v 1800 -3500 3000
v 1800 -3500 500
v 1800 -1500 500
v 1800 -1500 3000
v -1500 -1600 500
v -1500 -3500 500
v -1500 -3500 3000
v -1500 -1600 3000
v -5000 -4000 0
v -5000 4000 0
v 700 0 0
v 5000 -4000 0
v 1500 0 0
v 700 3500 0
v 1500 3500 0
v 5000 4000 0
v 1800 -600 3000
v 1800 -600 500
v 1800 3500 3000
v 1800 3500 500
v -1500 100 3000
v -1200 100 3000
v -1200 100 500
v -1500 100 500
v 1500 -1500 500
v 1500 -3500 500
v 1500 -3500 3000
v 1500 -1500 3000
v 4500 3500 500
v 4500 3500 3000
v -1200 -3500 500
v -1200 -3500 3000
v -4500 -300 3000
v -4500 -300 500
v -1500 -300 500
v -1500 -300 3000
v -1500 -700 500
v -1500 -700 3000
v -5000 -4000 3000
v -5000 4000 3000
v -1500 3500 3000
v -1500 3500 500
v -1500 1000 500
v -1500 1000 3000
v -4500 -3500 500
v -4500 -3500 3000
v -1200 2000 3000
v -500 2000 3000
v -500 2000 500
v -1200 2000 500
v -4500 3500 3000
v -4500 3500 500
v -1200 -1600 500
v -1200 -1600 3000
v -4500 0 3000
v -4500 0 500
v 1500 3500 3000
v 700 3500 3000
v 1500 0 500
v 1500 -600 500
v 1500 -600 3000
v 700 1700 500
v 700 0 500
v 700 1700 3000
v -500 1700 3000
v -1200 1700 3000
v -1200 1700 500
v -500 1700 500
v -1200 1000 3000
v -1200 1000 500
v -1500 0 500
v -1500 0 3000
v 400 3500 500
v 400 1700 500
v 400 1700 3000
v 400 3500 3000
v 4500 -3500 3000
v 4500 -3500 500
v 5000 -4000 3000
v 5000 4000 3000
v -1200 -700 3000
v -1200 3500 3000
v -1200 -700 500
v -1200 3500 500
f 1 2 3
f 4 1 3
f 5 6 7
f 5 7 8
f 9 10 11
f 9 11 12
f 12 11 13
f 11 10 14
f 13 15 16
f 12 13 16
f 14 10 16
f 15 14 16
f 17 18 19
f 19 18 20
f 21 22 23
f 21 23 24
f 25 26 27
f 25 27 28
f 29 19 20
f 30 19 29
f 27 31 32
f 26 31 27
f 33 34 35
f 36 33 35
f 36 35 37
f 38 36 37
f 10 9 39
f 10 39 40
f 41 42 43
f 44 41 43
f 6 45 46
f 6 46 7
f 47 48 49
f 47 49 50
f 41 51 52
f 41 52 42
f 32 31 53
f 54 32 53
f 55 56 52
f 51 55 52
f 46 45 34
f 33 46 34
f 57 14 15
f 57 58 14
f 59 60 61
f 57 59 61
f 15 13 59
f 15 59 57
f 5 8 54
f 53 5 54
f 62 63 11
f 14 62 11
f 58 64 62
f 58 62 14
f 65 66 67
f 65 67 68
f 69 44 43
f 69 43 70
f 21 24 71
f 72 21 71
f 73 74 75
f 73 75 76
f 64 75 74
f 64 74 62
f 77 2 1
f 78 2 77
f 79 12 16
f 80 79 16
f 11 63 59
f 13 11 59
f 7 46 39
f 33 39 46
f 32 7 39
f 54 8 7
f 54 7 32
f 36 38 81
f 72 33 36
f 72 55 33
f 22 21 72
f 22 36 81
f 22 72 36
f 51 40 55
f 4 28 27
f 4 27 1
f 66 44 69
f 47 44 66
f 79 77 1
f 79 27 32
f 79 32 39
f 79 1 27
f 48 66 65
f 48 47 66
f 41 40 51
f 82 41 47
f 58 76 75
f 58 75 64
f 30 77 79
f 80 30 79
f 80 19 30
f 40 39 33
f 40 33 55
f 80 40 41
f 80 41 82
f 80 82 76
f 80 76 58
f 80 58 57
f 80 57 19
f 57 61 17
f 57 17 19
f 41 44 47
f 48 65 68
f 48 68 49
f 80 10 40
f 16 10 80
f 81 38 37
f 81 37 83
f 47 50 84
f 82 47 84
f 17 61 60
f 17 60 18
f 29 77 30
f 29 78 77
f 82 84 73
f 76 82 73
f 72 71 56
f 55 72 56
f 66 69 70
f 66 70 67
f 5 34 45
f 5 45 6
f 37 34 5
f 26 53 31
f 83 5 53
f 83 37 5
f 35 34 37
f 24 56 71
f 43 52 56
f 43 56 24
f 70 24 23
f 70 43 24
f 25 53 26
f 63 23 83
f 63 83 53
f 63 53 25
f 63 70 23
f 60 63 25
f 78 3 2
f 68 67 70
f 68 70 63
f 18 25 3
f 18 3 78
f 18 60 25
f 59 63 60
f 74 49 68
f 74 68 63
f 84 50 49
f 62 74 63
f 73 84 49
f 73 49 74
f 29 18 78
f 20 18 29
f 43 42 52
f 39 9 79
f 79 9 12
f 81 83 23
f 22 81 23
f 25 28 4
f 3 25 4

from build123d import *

# Parameters (mm, degrees)
F0_W     = 10000
F0_H     = 8000
F1_DEPTH = 3000
F2_T     = -500
F3_W     = 800
F3_H     = 3500
F4_DEPTH = 500.001
F5_W     = 300
F5_H     = 1900
F5_H_2   = 2000
F5_H_3   = 4100
F5_H_4   = 1800
F6_DEPTH = 2500


with BuildPart() as f1:
    # F0 (on Top) → F1 (new body)
    with BuildSketch(Plane.XY):
        Rectangle(F0_W, F0_H)
    extrude(amount=F1_DEPTH)

    # F2
    f2_openings = [f1.faces().sort_by_distance(p)[0] for p in [
        (0, 0, 3000),
    ]]
    offset(amount=F2_T, openings=f2_openings)

    # F3 (on face) → F4 (cut, through all)
    with BuildSketch(Plane.XY.offset(500)):
        with Locations((1100, 1750)):
            Rectangle(F3_W, F3_H)
    extrude(amount=-F4_DEPTH, mode=Mode.SUBTRACT)

    # F5 (on face) → F6 (join, through all)
    with BuildSketch(Plane.XY.offset(500)):
        Polygon((-1200, 2000), (-1200, 3500), (-1500, 3500), (-1500, 1000), (-1200, 1000), (-1200, 1700), (-500, 1700), (-500, 2000), align=None)
        Polygon((-1200, 100), (-1500, 100), (-1500, 0), (-4500, 0), (-4500, -300), (-1500, -300), (-1500, -700), (-1200, -700), align=None)
        with Locations((-1350, -2550)):
            Rectangle(F5_W, F5_H)
        with Locations((1650, -2500)):
            Rectangle(F5_W, F5_H_2)
        with Locations((1650, 1450)):
            Rectangle(F5_W, F5_H_3)
        with Locations((550, 2600)):
            Rectangle(F5_W, F5_H_4)
    extrude(amount=F6_DEPTH)


solid = f1.part
